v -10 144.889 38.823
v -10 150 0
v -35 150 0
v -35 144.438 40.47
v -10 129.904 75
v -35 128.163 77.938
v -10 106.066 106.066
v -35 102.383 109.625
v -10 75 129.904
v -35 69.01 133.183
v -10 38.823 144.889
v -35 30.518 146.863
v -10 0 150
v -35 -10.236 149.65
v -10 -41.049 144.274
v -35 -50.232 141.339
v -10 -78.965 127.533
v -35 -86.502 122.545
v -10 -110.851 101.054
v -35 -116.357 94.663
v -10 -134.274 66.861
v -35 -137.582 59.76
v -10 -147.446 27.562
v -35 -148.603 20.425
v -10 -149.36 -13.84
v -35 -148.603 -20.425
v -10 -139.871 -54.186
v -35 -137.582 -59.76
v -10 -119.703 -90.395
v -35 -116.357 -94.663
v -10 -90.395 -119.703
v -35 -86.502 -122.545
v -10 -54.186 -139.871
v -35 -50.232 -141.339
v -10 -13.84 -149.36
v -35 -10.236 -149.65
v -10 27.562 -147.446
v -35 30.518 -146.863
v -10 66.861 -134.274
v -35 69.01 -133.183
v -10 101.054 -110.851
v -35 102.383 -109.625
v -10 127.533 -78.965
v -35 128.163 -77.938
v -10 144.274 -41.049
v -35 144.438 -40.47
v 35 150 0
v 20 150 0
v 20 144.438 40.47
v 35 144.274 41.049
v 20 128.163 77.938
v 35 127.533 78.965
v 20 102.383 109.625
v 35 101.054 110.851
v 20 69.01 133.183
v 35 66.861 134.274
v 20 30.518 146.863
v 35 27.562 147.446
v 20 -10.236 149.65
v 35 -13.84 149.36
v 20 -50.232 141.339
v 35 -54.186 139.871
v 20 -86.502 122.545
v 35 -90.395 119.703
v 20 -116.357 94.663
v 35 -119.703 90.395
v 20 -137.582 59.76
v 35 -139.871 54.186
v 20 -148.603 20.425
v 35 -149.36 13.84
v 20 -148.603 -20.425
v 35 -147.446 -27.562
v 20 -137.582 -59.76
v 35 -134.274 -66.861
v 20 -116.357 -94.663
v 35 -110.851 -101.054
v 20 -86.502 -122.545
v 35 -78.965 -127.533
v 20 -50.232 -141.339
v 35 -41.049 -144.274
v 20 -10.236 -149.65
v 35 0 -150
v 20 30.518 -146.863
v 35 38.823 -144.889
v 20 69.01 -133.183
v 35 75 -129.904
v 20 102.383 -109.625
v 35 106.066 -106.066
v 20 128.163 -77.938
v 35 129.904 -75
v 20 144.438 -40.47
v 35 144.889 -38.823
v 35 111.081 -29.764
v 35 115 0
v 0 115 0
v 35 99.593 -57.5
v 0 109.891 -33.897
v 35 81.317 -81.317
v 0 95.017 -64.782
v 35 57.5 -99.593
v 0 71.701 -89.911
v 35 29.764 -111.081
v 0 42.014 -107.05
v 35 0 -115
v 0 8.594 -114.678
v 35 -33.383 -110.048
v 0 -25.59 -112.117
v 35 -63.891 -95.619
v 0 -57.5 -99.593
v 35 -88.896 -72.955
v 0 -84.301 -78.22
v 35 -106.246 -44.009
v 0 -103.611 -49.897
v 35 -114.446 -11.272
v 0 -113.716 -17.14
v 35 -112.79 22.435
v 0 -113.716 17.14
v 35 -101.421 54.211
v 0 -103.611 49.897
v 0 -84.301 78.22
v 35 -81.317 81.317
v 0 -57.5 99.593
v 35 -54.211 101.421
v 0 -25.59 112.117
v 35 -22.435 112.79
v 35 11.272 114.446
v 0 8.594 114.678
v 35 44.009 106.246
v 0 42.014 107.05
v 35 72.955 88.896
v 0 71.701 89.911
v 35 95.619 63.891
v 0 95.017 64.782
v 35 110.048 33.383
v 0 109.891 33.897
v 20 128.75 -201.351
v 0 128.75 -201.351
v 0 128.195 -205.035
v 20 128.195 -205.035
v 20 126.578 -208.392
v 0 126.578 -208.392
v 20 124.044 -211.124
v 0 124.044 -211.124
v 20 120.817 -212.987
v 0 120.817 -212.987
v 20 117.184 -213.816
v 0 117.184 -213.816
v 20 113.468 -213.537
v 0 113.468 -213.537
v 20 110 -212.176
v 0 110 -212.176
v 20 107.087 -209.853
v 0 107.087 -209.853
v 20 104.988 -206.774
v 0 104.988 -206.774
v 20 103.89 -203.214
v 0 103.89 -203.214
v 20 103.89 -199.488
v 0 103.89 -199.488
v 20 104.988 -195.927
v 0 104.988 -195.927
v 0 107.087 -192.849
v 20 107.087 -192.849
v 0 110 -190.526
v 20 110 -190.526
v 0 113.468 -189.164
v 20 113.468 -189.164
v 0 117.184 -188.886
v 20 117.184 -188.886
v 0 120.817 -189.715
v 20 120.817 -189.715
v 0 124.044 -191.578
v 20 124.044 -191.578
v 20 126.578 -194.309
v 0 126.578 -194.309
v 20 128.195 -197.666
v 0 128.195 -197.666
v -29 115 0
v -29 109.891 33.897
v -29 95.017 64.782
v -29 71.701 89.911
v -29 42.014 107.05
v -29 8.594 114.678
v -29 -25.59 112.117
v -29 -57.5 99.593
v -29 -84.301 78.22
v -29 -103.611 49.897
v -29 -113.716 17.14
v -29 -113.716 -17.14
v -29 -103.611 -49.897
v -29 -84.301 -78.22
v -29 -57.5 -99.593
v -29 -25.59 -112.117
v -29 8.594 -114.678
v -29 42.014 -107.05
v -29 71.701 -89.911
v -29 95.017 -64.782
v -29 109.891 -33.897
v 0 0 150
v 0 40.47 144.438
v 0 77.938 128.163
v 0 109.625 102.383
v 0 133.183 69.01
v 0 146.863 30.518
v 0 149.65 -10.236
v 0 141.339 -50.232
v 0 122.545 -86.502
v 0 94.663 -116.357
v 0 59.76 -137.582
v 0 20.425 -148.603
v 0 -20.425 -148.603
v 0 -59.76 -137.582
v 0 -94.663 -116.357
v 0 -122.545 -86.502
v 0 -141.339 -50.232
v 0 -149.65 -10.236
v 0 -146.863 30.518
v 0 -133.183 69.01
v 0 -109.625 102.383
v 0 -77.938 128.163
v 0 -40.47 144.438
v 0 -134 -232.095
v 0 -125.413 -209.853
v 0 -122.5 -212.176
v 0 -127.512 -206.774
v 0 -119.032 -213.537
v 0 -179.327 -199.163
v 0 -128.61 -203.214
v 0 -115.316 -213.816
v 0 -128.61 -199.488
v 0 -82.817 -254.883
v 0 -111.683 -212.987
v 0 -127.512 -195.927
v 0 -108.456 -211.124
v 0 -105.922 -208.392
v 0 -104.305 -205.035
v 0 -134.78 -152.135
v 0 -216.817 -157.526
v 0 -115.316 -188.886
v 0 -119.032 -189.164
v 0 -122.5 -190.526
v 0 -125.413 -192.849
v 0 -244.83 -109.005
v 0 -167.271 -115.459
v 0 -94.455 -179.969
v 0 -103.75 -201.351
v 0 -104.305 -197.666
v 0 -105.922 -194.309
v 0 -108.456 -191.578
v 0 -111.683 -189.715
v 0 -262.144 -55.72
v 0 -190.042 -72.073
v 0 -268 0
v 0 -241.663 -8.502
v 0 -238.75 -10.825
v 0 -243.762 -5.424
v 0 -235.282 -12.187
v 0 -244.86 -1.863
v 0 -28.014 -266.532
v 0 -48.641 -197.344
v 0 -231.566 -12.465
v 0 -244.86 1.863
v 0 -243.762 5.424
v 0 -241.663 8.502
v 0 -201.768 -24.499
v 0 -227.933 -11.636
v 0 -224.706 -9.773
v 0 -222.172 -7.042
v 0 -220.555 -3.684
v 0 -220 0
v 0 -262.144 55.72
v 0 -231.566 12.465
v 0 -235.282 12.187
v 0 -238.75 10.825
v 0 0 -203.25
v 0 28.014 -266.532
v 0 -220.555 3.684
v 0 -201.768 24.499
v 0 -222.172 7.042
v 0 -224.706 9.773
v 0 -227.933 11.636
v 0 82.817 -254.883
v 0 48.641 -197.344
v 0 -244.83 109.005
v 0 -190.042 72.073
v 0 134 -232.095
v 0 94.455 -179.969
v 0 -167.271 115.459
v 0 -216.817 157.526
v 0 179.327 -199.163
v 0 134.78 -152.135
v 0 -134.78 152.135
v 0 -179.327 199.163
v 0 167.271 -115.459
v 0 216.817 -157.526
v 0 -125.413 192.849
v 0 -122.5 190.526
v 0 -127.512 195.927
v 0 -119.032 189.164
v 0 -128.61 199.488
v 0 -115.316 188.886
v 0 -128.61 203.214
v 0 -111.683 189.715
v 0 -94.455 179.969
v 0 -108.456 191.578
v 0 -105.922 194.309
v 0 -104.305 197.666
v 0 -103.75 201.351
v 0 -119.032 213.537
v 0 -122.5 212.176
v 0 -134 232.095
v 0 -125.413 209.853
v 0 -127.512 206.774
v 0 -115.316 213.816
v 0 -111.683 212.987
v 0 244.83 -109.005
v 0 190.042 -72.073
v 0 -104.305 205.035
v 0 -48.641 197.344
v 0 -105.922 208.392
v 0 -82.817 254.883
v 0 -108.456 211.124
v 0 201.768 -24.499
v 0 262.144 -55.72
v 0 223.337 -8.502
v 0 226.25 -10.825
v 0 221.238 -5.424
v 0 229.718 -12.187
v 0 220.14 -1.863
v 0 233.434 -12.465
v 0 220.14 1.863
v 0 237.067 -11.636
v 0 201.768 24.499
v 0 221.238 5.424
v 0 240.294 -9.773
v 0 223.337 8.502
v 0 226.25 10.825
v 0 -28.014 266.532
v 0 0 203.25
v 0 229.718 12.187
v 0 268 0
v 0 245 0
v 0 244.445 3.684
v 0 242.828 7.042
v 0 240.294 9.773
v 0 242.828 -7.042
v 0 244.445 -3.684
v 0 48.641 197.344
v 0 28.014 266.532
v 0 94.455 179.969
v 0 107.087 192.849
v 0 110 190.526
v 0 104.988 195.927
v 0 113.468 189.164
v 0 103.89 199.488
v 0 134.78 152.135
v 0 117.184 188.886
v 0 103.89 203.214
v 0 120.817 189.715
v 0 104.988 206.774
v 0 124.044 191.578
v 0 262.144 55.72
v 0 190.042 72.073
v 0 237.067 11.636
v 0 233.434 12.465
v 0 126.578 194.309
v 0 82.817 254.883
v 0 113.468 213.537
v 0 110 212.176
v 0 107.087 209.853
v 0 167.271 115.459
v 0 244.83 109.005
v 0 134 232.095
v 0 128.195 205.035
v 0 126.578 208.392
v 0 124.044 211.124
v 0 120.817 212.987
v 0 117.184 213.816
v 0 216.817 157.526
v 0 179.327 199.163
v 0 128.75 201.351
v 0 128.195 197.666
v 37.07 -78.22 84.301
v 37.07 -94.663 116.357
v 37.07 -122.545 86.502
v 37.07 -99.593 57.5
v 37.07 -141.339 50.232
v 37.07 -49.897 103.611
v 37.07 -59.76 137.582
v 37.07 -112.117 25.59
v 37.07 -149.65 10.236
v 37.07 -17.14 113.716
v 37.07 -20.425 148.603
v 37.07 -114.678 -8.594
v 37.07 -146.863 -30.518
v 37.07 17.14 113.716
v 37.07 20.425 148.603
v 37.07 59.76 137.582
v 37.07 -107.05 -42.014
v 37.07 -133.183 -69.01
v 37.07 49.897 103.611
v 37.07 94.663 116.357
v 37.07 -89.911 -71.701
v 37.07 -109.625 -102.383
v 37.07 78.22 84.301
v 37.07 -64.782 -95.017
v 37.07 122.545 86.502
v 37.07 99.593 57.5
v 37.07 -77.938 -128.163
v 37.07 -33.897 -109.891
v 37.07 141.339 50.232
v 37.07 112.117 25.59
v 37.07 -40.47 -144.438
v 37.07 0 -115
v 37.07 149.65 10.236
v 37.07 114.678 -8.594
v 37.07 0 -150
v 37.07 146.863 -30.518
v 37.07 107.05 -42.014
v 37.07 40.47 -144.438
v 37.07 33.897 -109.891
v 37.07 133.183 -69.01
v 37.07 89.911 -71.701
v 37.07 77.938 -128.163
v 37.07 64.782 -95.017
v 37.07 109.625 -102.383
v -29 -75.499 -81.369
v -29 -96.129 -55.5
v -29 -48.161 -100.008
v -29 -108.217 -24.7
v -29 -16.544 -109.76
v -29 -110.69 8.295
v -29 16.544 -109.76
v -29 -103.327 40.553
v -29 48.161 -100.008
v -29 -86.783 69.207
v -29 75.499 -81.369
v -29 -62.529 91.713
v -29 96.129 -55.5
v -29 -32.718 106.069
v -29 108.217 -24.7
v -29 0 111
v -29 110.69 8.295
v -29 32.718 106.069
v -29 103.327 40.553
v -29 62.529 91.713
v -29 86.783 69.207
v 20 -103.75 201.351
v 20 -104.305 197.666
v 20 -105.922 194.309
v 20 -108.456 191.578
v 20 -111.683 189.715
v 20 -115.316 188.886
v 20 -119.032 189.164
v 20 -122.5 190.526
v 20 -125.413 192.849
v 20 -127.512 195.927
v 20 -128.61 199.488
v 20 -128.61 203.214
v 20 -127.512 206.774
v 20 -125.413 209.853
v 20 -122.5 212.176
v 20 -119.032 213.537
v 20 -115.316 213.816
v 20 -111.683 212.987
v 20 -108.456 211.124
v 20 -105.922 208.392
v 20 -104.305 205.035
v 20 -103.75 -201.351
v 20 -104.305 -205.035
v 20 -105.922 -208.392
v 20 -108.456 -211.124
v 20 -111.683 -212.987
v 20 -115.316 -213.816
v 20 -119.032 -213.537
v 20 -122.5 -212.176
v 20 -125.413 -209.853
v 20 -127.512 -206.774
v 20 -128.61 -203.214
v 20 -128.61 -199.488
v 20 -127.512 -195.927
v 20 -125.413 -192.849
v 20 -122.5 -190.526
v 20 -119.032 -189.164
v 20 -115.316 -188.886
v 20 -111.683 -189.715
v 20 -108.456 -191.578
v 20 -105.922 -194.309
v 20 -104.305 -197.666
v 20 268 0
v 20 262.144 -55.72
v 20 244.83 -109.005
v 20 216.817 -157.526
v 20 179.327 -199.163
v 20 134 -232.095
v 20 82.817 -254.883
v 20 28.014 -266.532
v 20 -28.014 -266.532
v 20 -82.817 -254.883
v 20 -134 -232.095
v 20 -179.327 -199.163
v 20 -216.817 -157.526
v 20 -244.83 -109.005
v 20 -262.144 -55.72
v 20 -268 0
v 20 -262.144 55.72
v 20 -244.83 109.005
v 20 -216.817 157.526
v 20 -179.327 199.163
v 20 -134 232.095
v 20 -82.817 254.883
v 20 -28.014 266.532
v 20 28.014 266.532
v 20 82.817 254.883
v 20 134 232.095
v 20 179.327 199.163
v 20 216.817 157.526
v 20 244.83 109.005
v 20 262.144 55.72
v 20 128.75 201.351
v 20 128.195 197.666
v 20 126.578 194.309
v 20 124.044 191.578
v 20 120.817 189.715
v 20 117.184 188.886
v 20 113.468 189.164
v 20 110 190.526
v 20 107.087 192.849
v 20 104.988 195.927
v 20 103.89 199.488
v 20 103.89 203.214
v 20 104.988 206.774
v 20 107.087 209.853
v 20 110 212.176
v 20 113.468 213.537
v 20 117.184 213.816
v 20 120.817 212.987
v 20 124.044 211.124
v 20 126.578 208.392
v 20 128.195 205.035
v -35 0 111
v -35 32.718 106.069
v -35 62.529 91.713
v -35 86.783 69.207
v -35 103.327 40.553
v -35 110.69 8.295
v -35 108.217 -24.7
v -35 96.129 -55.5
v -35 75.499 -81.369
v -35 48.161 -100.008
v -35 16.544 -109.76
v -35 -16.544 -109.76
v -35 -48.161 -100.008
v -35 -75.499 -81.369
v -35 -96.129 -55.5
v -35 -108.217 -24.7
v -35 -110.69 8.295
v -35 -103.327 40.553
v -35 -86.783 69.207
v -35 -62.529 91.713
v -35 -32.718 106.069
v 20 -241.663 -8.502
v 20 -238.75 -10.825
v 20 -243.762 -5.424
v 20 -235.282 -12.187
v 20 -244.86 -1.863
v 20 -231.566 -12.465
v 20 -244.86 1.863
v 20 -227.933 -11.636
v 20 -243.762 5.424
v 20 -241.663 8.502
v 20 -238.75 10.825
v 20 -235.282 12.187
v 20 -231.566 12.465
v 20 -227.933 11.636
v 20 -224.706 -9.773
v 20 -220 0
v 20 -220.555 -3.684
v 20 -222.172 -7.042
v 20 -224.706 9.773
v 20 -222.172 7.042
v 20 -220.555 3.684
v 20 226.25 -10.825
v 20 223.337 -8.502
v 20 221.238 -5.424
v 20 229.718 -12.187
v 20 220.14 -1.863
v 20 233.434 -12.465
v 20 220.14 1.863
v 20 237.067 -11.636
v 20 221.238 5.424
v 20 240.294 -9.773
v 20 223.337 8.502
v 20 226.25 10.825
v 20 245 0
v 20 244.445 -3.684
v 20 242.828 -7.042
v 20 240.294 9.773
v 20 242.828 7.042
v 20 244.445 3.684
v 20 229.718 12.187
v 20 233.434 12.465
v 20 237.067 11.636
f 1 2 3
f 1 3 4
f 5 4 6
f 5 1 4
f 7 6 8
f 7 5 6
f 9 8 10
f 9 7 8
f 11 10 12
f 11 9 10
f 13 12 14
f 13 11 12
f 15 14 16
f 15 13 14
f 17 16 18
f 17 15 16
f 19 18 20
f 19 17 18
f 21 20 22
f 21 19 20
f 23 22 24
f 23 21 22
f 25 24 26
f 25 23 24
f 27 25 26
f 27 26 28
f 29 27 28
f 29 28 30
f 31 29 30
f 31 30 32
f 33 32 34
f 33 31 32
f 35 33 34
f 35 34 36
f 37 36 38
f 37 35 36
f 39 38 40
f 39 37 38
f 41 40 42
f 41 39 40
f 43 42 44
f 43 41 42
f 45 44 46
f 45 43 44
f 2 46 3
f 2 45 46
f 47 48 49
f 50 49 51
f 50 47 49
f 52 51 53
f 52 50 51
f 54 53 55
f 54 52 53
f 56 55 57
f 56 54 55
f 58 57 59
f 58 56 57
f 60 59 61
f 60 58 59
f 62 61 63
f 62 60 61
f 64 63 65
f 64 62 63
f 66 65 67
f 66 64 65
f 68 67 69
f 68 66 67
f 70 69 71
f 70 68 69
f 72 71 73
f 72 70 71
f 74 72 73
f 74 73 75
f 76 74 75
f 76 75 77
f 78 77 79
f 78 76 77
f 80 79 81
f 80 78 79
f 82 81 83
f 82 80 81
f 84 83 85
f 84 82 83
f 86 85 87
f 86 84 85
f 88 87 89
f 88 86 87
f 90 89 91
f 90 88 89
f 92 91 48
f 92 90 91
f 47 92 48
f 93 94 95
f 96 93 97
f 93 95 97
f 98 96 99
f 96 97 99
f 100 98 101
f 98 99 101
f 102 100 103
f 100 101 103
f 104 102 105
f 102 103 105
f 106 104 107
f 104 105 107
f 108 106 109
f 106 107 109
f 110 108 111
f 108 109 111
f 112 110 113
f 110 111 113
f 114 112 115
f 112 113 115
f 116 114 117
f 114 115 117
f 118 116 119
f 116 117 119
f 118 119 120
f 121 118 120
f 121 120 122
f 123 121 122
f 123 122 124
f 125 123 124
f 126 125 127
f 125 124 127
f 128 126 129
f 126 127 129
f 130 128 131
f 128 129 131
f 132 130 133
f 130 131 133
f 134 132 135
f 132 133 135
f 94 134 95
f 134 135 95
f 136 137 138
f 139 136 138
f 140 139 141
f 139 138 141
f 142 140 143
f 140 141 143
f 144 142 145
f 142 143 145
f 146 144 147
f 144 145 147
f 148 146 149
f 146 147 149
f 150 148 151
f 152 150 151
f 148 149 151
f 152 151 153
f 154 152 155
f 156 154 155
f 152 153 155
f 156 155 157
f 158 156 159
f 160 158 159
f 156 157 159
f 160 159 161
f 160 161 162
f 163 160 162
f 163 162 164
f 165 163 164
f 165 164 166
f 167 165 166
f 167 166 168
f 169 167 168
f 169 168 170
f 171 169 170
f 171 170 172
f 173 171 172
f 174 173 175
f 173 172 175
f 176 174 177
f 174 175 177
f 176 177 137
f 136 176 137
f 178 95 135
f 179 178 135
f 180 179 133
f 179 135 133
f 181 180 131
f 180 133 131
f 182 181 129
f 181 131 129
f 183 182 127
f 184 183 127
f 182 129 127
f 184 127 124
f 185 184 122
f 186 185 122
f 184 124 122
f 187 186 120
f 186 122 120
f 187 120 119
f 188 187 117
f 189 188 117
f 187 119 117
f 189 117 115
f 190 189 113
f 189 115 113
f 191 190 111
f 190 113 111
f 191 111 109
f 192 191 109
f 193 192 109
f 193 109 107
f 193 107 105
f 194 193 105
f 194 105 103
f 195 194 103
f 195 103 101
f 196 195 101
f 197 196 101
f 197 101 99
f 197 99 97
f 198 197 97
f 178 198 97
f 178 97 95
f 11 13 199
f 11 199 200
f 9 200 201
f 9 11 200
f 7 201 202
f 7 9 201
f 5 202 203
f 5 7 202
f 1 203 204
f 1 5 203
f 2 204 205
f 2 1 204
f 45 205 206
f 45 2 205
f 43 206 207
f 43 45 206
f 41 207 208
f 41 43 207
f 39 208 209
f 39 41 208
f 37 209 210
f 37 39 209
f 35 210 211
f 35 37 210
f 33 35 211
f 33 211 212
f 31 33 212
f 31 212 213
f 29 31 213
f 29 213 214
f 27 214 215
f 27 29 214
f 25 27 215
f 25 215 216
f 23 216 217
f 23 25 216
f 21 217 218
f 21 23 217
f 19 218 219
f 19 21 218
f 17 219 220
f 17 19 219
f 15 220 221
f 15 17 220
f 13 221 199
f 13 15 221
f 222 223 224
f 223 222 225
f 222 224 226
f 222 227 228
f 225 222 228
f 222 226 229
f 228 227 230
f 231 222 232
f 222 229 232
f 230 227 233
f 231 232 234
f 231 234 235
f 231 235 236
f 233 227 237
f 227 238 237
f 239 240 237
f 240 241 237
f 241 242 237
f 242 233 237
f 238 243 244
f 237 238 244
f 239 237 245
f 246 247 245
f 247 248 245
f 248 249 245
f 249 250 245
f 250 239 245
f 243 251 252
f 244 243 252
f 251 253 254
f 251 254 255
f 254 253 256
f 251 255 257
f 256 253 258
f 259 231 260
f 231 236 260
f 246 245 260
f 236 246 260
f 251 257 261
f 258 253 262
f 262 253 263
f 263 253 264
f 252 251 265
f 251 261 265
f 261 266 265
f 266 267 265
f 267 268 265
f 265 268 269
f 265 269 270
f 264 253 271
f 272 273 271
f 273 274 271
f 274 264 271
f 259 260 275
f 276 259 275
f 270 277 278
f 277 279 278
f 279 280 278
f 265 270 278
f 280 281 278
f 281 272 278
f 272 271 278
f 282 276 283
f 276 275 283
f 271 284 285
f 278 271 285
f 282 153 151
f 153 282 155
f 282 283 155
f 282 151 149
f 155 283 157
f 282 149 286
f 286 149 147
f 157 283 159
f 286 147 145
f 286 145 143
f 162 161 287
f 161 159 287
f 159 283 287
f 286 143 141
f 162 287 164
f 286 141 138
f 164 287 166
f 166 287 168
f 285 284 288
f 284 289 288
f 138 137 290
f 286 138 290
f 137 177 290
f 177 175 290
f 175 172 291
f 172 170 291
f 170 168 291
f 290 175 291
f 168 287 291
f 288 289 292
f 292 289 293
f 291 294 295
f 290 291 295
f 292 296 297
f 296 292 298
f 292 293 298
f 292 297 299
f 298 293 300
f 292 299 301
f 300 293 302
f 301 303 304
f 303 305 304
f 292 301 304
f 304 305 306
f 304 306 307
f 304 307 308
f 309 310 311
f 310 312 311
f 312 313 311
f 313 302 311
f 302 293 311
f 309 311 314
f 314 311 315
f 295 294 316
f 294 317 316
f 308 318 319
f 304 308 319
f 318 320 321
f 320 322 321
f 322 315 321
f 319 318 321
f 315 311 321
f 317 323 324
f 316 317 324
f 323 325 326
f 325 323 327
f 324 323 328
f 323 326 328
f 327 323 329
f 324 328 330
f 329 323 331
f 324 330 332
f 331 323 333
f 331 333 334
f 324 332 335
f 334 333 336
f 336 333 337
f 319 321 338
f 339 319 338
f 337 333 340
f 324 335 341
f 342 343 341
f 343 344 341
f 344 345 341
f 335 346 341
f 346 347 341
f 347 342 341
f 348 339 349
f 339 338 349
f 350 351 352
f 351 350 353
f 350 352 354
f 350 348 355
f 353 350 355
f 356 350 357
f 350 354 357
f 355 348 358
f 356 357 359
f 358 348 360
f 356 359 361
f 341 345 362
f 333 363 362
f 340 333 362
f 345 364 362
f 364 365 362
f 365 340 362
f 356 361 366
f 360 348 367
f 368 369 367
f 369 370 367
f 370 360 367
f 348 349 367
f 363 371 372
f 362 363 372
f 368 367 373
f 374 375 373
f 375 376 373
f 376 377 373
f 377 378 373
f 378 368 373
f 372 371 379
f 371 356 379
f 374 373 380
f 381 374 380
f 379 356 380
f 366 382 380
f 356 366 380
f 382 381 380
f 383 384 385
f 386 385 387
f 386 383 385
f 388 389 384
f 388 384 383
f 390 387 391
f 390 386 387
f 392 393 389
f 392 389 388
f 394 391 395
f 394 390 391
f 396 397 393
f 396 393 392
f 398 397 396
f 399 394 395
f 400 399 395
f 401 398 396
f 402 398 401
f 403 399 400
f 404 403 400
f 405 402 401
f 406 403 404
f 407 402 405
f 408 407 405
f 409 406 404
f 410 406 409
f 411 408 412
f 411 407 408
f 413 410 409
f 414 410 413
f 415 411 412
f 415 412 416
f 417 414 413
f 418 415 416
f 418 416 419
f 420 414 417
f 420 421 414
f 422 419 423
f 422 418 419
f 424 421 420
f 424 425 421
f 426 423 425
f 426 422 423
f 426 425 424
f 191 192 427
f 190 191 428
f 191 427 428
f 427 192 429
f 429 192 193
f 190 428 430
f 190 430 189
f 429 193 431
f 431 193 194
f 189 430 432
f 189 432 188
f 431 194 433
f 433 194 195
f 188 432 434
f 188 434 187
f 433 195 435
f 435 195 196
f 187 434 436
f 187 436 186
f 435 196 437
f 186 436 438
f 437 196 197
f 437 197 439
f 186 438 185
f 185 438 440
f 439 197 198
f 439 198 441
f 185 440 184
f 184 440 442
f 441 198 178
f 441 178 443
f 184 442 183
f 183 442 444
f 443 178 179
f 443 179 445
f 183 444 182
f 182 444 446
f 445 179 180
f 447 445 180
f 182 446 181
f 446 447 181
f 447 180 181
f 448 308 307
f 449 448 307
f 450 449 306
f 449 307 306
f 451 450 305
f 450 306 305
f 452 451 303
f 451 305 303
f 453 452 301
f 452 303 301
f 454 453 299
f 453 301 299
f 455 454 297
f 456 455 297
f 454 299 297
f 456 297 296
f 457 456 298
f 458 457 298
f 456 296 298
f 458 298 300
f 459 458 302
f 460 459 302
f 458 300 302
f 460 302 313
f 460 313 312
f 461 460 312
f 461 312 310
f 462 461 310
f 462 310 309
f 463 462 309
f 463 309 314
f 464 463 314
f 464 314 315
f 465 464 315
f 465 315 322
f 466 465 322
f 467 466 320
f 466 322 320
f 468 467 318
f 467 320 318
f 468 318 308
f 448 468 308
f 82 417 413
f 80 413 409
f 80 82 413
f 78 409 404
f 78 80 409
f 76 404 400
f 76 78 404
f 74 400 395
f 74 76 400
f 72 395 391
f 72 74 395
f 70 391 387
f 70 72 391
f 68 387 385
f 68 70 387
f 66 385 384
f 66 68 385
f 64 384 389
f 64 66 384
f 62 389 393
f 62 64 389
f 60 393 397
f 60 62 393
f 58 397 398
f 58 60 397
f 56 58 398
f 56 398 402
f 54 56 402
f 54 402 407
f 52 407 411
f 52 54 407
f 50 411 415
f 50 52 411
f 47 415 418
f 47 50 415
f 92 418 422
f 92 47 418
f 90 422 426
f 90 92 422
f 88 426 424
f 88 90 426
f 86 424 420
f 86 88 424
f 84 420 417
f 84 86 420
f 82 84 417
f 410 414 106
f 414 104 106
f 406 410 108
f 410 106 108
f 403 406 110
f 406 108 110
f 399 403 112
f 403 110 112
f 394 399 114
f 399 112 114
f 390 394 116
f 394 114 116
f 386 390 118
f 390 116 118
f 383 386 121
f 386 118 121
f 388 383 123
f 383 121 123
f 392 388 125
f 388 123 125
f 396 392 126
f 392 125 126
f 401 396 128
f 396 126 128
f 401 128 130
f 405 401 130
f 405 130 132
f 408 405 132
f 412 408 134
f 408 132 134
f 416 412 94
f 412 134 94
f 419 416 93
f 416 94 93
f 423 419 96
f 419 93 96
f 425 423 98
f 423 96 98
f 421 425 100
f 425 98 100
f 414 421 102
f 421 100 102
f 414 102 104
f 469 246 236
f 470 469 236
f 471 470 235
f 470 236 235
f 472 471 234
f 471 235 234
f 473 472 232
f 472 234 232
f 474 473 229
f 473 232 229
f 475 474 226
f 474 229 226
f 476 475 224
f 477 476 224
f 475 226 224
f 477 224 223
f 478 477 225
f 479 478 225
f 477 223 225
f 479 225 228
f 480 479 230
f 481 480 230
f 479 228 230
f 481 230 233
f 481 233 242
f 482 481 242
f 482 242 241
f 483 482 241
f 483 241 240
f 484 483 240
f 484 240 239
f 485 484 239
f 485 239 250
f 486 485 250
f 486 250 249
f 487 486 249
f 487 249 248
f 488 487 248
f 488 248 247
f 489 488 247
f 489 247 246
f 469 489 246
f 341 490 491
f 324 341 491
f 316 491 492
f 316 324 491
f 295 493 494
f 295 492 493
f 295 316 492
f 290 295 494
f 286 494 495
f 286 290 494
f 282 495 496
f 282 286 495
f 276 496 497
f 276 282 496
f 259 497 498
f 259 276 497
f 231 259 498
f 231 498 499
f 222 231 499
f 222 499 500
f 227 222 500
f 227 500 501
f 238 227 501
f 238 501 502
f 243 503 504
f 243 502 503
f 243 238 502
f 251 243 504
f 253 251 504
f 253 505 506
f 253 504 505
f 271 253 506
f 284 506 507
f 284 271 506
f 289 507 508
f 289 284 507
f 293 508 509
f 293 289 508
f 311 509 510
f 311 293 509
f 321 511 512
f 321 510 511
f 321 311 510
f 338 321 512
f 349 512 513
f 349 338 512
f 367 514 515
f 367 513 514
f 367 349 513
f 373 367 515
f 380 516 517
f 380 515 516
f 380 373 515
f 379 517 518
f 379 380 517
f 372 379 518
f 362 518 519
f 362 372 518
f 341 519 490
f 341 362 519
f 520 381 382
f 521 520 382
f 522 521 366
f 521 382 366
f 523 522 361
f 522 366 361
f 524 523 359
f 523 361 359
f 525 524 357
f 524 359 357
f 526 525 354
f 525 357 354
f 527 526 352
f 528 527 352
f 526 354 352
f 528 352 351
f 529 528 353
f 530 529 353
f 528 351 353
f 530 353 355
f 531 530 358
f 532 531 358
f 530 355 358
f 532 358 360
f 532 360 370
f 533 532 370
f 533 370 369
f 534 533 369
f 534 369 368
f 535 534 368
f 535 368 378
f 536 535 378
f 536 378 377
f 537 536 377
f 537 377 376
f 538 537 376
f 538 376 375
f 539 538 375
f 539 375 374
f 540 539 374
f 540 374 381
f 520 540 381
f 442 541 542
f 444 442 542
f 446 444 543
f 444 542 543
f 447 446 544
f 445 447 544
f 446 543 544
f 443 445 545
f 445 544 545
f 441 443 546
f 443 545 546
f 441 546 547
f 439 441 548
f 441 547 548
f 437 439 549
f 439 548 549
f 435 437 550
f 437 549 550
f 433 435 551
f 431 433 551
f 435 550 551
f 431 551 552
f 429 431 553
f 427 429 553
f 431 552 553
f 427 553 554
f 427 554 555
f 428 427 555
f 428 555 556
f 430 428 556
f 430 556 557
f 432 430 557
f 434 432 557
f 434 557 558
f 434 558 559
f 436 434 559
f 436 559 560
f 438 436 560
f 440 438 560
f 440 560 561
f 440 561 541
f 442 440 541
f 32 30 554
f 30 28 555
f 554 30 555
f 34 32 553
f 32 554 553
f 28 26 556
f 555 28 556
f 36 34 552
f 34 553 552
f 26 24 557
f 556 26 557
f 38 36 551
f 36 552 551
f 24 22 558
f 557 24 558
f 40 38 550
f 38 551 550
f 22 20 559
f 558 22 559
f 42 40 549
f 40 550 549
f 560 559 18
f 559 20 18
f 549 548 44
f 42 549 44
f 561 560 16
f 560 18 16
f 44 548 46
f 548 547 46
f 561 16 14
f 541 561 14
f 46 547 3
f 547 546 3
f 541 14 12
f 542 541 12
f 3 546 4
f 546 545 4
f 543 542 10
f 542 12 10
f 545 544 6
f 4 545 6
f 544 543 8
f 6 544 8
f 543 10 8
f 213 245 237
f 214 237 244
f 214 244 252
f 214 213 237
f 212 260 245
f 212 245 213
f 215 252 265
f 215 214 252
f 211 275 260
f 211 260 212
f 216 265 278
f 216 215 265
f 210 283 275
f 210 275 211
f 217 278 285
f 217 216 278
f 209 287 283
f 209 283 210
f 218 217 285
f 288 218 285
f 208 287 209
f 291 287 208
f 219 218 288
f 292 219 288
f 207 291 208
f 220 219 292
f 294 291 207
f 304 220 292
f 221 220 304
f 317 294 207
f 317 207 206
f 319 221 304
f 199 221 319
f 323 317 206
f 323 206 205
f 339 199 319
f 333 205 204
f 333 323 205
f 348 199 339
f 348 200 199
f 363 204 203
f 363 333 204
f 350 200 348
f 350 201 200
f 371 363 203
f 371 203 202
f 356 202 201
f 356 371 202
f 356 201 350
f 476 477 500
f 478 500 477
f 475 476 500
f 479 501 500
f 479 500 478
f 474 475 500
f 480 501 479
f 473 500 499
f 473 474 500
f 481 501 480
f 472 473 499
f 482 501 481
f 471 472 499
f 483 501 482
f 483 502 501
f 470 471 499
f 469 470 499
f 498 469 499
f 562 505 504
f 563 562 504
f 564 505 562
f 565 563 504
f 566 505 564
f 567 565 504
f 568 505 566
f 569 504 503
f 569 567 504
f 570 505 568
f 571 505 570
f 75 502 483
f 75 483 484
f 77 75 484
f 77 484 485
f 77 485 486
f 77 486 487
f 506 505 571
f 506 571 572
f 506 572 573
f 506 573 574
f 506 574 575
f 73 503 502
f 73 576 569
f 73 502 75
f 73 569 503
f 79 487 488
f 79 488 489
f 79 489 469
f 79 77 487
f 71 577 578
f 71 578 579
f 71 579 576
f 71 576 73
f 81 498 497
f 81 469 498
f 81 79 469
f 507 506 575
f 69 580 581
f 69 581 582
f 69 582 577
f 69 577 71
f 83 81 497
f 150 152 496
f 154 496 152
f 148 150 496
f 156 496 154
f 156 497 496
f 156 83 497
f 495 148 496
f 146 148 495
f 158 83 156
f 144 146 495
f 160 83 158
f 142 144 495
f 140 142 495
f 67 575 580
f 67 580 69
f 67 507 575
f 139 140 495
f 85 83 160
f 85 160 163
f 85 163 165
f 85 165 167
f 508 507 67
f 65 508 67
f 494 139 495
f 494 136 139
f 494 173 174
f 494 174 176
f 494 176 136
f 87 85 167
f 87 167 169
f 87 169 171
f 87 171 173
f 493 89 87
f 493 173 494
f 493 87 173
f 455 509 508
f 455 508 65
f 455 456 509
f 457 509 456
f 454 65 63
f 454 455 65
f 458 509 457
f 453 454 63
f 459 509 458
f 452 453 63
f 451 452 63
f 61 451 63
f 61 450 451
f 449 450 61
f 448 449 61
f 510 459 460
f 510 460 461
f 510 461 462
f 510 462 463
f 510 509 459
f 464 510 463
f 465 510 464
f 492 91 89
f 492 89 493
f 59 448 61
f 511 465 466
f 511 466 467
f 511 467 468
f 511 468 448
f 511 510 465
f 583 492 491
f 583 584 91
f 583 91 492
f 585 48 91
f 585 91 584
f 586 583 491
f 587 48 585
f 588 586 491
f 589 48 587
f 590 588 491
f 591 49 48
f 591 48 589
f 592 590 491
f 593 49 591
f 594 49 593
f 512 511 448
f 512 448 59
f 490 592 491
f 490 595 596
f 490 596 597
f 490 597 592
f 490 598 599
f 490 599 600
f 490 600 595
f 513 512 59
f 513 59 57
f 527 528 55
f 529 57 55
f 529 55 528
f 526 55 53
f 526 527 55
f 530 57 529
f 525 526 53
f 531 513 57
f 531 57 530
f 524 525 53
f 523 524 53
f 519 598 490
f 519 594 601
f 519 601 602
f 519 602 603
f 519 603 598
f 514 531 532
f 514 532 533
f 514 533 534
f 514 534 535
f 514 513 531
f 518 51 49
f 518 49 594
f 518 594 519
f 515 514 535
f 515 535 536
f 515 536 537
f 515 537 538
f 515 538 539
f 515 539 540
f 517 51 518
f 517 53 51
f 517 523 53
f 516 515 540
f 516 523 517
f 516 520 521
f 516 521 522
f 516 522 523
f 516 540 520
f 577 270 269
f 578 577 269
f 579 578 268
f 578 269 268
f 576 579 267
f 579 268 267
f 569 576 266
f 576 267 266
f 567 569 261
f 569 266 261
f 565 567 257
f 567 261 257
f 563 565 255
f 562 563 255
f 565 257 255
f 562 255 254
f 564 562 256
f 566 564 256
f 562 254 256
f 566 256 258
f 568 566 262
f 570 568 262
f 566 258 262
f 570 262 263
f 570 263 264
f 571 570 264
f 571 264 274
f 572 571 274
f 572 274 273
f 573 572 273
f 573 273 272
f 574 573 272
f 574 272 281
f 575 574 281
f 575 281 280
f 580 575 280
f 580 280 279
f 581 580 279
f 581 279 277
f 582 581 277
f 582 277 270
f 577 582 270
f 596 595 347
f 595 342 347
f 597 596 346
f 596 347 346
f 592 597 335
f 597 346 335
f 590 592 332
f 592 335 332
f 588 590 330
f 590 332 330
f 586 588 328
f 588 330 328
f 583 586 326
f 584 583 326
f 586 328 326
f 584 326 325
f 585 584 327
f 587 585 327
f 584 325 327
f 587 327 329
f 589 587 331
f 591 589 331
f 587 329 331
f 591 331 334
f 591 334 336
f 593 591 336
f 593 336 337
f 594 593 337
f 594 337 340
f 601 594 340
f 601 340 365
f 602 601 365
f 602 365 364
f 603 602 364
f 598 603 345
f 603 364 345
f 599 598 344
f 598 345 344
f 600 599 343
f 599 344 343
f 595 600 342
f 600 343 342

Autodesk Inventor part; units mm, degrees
ref_plane "YZ Plane" through (0, 0, 0) normal (1, 0, 0) x (0, 1, 0)
ref_plane "XZ Plane" through (0, 0, 0) normal (0, 1, 0) x (-1, 0, 0)
sketch "Sketch1" plane through (0, 0, 0) normal (1, 0, 0) x (0, 1, 0)
  circle A0 centre (0, 0) radius 268
  circle A1 centre (0, 0) radius 203.25
  circle A2 centre (0, 0) radius 232.5
  circle A3 centre (232.5, 0) radius 12.5
  circle A4 centre (116.25, 201.3509) radius 12.5
  circle A5 centre (-116.25, 201.3509) radius 12.5
  circle A6 centre (-232.5, 0) radius 12.5
  circle A7 centre (-116.25, -201.3509) radius 12.5
  circle A8 centre (116.25, -201.3509) radius 12.5
  dimension "d2" = 465
  dimension "d0" = 536
  dimension "d1" = 406.5
  dimension "d3" = 25
  dimension "d101" = 360
extrude "Extrusion1" add sketch "Sketch1" along normal blind 20 contours A0 | A3 A2 A8 A7 A6 A5 A4
sketch "Sketch2" plane through (0, 0, 0) normal (1, 0, 0) x (0, 1, 0)
  circle A0 centre (0, 0) radius 115
  circle A1 centre (0, 0) radius 150
  dimension "d10" = 230
  dimension "d11" = 300
extrude "Extrusion2" add sketch "Sketch2" against normal mid plane 70
ref_plane "Work Plane1" through (-10, 0, 0) normal (-1, 0, 0) x (0, 0, 1)
sketch "Sketch3" plane through (-10, 0, 0) normal (-1, 0, 0) x (0, 0, 1)
  circle A0 centre (0, 0) radius 203.25
  circle A1 centre (0, 0) radius 150
  dimension "d15" = 406.5
  dimension "d16" = 300
extrude "Extrusion3" add sketch "Sketch3" against normal blind 30
sketch "Sketch4" plane through (-35, 0, 0) normal (-1, 0, 0) x (0, 0, 1)
  circle A0 centre (0, 0) radius 113.4667
  circle A1 centre (0, 0) radius 111
  circle A2 centre (0, 0) radius 115
  dimension "d43" = 222
  dimension "d44" = 230
extrude "Extrusion4" add sketch "Sketch4" against normal blind 6 contours A0 | A2
sketch "Sketch6" plane through (35, 0, 0) normal (1, 0, 0) x (0, 0, -1)
  circle A0 centre (0, 0) radius 150
  circle A1 centre (0, 0) radius 115
  dimension "d61" = 300
extrude "Extrusion6" add sketch "Sketch6" along normal blind 2.07
thread "Thread20" size "M25x2" class "6H" standard "ANSI Metric M Profile" full length
sketch "Sketch9" plane through (-10, 0, 0) normal (-1, 0, 0) x (0, 0, 1)
  circle A0 centre (0, 0) radius 203.25
  circle A1 centre (0, 0) radius 150
extrude "Extrusion8" cut sketch "Sketch9" against normal up to surface (10 mm away)
thread "Thread30" size "M25x2" class "6H" standard "ANSI Metric M Profile" full length
thread "Thread31" size "M25x2" class "6H" standard "ANSI Metric M Profile" full length
thread "Thread32" size "M25x2" class "6H" standard "ANSI Metric M Profile" full length
thread "Thread33" size "M25x2" class "6H" standard "ANSI Metric M Profile" full length
thread "Thread34" size "M25x2" class "6H" standard "ANSI Metric M Profile" full length
equation "\"BendRadius\" = Thickness"
equation "\"BendReliefWidth\" = Thickness"
equation "\"BendReliefDepth\" = 0.5 * Thickness"
equation "\"CornerReliefSize\" = 4 * Thickness"
equation "\"MinimumRemnant\" = 2 * Thickness"
equation "\"TransitionRadius\" = BendRadius"
equation "\"JacobiRadiusSize\" = BendRadius"
equation "\"GapSize\" = Thickness"
equation "\"Thickness\" = 0.5"
properties part number "elasmaROyleman"
